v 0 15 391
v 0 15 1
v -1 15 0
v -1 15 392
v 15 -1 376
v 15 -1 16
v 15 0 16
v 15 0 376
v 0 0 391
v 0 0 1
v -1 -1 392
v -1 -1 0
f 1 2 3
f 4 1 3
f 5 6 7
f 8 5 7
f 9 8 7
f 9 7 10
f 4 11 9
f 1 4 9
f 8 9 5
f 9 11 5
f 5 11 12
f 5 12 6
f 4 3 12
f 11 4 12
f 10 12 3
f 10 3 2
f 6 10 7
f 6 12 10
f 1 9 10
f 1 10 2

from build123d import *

# Parameters (mm, degrees)
EXTRUDE_THIN1_DEPTH = 392
CUT_EXTRUDE1_DEPTH  = 393.613041047


with BuildPart() as part:
    # Sketch1 → Extrude-Thin1 (new body)
    with BuildSketch(Plane.XY):
        Polygon((15, 0), (0, 0), (0, 15), (-1, 15), (-1, -1), (15, -1), align=None)
    extrude(amount=EXTRUDE_THIN1_DEPTH)

    # Sketch2 → Cut-Extrude1 (cut, through all)
    with BuildSketch(Plane.XZ.offset(1)):
        Polygon((-1, 392), (15, 376), (15, 392), align=None)
        Polygon((15, 16), (15, 0), (-1, 0), align=None)
    extrude(amount=-CUT_EXTRUDE1_DEPTH, mode=Mode.SUBTRACT)


solid = part.part
